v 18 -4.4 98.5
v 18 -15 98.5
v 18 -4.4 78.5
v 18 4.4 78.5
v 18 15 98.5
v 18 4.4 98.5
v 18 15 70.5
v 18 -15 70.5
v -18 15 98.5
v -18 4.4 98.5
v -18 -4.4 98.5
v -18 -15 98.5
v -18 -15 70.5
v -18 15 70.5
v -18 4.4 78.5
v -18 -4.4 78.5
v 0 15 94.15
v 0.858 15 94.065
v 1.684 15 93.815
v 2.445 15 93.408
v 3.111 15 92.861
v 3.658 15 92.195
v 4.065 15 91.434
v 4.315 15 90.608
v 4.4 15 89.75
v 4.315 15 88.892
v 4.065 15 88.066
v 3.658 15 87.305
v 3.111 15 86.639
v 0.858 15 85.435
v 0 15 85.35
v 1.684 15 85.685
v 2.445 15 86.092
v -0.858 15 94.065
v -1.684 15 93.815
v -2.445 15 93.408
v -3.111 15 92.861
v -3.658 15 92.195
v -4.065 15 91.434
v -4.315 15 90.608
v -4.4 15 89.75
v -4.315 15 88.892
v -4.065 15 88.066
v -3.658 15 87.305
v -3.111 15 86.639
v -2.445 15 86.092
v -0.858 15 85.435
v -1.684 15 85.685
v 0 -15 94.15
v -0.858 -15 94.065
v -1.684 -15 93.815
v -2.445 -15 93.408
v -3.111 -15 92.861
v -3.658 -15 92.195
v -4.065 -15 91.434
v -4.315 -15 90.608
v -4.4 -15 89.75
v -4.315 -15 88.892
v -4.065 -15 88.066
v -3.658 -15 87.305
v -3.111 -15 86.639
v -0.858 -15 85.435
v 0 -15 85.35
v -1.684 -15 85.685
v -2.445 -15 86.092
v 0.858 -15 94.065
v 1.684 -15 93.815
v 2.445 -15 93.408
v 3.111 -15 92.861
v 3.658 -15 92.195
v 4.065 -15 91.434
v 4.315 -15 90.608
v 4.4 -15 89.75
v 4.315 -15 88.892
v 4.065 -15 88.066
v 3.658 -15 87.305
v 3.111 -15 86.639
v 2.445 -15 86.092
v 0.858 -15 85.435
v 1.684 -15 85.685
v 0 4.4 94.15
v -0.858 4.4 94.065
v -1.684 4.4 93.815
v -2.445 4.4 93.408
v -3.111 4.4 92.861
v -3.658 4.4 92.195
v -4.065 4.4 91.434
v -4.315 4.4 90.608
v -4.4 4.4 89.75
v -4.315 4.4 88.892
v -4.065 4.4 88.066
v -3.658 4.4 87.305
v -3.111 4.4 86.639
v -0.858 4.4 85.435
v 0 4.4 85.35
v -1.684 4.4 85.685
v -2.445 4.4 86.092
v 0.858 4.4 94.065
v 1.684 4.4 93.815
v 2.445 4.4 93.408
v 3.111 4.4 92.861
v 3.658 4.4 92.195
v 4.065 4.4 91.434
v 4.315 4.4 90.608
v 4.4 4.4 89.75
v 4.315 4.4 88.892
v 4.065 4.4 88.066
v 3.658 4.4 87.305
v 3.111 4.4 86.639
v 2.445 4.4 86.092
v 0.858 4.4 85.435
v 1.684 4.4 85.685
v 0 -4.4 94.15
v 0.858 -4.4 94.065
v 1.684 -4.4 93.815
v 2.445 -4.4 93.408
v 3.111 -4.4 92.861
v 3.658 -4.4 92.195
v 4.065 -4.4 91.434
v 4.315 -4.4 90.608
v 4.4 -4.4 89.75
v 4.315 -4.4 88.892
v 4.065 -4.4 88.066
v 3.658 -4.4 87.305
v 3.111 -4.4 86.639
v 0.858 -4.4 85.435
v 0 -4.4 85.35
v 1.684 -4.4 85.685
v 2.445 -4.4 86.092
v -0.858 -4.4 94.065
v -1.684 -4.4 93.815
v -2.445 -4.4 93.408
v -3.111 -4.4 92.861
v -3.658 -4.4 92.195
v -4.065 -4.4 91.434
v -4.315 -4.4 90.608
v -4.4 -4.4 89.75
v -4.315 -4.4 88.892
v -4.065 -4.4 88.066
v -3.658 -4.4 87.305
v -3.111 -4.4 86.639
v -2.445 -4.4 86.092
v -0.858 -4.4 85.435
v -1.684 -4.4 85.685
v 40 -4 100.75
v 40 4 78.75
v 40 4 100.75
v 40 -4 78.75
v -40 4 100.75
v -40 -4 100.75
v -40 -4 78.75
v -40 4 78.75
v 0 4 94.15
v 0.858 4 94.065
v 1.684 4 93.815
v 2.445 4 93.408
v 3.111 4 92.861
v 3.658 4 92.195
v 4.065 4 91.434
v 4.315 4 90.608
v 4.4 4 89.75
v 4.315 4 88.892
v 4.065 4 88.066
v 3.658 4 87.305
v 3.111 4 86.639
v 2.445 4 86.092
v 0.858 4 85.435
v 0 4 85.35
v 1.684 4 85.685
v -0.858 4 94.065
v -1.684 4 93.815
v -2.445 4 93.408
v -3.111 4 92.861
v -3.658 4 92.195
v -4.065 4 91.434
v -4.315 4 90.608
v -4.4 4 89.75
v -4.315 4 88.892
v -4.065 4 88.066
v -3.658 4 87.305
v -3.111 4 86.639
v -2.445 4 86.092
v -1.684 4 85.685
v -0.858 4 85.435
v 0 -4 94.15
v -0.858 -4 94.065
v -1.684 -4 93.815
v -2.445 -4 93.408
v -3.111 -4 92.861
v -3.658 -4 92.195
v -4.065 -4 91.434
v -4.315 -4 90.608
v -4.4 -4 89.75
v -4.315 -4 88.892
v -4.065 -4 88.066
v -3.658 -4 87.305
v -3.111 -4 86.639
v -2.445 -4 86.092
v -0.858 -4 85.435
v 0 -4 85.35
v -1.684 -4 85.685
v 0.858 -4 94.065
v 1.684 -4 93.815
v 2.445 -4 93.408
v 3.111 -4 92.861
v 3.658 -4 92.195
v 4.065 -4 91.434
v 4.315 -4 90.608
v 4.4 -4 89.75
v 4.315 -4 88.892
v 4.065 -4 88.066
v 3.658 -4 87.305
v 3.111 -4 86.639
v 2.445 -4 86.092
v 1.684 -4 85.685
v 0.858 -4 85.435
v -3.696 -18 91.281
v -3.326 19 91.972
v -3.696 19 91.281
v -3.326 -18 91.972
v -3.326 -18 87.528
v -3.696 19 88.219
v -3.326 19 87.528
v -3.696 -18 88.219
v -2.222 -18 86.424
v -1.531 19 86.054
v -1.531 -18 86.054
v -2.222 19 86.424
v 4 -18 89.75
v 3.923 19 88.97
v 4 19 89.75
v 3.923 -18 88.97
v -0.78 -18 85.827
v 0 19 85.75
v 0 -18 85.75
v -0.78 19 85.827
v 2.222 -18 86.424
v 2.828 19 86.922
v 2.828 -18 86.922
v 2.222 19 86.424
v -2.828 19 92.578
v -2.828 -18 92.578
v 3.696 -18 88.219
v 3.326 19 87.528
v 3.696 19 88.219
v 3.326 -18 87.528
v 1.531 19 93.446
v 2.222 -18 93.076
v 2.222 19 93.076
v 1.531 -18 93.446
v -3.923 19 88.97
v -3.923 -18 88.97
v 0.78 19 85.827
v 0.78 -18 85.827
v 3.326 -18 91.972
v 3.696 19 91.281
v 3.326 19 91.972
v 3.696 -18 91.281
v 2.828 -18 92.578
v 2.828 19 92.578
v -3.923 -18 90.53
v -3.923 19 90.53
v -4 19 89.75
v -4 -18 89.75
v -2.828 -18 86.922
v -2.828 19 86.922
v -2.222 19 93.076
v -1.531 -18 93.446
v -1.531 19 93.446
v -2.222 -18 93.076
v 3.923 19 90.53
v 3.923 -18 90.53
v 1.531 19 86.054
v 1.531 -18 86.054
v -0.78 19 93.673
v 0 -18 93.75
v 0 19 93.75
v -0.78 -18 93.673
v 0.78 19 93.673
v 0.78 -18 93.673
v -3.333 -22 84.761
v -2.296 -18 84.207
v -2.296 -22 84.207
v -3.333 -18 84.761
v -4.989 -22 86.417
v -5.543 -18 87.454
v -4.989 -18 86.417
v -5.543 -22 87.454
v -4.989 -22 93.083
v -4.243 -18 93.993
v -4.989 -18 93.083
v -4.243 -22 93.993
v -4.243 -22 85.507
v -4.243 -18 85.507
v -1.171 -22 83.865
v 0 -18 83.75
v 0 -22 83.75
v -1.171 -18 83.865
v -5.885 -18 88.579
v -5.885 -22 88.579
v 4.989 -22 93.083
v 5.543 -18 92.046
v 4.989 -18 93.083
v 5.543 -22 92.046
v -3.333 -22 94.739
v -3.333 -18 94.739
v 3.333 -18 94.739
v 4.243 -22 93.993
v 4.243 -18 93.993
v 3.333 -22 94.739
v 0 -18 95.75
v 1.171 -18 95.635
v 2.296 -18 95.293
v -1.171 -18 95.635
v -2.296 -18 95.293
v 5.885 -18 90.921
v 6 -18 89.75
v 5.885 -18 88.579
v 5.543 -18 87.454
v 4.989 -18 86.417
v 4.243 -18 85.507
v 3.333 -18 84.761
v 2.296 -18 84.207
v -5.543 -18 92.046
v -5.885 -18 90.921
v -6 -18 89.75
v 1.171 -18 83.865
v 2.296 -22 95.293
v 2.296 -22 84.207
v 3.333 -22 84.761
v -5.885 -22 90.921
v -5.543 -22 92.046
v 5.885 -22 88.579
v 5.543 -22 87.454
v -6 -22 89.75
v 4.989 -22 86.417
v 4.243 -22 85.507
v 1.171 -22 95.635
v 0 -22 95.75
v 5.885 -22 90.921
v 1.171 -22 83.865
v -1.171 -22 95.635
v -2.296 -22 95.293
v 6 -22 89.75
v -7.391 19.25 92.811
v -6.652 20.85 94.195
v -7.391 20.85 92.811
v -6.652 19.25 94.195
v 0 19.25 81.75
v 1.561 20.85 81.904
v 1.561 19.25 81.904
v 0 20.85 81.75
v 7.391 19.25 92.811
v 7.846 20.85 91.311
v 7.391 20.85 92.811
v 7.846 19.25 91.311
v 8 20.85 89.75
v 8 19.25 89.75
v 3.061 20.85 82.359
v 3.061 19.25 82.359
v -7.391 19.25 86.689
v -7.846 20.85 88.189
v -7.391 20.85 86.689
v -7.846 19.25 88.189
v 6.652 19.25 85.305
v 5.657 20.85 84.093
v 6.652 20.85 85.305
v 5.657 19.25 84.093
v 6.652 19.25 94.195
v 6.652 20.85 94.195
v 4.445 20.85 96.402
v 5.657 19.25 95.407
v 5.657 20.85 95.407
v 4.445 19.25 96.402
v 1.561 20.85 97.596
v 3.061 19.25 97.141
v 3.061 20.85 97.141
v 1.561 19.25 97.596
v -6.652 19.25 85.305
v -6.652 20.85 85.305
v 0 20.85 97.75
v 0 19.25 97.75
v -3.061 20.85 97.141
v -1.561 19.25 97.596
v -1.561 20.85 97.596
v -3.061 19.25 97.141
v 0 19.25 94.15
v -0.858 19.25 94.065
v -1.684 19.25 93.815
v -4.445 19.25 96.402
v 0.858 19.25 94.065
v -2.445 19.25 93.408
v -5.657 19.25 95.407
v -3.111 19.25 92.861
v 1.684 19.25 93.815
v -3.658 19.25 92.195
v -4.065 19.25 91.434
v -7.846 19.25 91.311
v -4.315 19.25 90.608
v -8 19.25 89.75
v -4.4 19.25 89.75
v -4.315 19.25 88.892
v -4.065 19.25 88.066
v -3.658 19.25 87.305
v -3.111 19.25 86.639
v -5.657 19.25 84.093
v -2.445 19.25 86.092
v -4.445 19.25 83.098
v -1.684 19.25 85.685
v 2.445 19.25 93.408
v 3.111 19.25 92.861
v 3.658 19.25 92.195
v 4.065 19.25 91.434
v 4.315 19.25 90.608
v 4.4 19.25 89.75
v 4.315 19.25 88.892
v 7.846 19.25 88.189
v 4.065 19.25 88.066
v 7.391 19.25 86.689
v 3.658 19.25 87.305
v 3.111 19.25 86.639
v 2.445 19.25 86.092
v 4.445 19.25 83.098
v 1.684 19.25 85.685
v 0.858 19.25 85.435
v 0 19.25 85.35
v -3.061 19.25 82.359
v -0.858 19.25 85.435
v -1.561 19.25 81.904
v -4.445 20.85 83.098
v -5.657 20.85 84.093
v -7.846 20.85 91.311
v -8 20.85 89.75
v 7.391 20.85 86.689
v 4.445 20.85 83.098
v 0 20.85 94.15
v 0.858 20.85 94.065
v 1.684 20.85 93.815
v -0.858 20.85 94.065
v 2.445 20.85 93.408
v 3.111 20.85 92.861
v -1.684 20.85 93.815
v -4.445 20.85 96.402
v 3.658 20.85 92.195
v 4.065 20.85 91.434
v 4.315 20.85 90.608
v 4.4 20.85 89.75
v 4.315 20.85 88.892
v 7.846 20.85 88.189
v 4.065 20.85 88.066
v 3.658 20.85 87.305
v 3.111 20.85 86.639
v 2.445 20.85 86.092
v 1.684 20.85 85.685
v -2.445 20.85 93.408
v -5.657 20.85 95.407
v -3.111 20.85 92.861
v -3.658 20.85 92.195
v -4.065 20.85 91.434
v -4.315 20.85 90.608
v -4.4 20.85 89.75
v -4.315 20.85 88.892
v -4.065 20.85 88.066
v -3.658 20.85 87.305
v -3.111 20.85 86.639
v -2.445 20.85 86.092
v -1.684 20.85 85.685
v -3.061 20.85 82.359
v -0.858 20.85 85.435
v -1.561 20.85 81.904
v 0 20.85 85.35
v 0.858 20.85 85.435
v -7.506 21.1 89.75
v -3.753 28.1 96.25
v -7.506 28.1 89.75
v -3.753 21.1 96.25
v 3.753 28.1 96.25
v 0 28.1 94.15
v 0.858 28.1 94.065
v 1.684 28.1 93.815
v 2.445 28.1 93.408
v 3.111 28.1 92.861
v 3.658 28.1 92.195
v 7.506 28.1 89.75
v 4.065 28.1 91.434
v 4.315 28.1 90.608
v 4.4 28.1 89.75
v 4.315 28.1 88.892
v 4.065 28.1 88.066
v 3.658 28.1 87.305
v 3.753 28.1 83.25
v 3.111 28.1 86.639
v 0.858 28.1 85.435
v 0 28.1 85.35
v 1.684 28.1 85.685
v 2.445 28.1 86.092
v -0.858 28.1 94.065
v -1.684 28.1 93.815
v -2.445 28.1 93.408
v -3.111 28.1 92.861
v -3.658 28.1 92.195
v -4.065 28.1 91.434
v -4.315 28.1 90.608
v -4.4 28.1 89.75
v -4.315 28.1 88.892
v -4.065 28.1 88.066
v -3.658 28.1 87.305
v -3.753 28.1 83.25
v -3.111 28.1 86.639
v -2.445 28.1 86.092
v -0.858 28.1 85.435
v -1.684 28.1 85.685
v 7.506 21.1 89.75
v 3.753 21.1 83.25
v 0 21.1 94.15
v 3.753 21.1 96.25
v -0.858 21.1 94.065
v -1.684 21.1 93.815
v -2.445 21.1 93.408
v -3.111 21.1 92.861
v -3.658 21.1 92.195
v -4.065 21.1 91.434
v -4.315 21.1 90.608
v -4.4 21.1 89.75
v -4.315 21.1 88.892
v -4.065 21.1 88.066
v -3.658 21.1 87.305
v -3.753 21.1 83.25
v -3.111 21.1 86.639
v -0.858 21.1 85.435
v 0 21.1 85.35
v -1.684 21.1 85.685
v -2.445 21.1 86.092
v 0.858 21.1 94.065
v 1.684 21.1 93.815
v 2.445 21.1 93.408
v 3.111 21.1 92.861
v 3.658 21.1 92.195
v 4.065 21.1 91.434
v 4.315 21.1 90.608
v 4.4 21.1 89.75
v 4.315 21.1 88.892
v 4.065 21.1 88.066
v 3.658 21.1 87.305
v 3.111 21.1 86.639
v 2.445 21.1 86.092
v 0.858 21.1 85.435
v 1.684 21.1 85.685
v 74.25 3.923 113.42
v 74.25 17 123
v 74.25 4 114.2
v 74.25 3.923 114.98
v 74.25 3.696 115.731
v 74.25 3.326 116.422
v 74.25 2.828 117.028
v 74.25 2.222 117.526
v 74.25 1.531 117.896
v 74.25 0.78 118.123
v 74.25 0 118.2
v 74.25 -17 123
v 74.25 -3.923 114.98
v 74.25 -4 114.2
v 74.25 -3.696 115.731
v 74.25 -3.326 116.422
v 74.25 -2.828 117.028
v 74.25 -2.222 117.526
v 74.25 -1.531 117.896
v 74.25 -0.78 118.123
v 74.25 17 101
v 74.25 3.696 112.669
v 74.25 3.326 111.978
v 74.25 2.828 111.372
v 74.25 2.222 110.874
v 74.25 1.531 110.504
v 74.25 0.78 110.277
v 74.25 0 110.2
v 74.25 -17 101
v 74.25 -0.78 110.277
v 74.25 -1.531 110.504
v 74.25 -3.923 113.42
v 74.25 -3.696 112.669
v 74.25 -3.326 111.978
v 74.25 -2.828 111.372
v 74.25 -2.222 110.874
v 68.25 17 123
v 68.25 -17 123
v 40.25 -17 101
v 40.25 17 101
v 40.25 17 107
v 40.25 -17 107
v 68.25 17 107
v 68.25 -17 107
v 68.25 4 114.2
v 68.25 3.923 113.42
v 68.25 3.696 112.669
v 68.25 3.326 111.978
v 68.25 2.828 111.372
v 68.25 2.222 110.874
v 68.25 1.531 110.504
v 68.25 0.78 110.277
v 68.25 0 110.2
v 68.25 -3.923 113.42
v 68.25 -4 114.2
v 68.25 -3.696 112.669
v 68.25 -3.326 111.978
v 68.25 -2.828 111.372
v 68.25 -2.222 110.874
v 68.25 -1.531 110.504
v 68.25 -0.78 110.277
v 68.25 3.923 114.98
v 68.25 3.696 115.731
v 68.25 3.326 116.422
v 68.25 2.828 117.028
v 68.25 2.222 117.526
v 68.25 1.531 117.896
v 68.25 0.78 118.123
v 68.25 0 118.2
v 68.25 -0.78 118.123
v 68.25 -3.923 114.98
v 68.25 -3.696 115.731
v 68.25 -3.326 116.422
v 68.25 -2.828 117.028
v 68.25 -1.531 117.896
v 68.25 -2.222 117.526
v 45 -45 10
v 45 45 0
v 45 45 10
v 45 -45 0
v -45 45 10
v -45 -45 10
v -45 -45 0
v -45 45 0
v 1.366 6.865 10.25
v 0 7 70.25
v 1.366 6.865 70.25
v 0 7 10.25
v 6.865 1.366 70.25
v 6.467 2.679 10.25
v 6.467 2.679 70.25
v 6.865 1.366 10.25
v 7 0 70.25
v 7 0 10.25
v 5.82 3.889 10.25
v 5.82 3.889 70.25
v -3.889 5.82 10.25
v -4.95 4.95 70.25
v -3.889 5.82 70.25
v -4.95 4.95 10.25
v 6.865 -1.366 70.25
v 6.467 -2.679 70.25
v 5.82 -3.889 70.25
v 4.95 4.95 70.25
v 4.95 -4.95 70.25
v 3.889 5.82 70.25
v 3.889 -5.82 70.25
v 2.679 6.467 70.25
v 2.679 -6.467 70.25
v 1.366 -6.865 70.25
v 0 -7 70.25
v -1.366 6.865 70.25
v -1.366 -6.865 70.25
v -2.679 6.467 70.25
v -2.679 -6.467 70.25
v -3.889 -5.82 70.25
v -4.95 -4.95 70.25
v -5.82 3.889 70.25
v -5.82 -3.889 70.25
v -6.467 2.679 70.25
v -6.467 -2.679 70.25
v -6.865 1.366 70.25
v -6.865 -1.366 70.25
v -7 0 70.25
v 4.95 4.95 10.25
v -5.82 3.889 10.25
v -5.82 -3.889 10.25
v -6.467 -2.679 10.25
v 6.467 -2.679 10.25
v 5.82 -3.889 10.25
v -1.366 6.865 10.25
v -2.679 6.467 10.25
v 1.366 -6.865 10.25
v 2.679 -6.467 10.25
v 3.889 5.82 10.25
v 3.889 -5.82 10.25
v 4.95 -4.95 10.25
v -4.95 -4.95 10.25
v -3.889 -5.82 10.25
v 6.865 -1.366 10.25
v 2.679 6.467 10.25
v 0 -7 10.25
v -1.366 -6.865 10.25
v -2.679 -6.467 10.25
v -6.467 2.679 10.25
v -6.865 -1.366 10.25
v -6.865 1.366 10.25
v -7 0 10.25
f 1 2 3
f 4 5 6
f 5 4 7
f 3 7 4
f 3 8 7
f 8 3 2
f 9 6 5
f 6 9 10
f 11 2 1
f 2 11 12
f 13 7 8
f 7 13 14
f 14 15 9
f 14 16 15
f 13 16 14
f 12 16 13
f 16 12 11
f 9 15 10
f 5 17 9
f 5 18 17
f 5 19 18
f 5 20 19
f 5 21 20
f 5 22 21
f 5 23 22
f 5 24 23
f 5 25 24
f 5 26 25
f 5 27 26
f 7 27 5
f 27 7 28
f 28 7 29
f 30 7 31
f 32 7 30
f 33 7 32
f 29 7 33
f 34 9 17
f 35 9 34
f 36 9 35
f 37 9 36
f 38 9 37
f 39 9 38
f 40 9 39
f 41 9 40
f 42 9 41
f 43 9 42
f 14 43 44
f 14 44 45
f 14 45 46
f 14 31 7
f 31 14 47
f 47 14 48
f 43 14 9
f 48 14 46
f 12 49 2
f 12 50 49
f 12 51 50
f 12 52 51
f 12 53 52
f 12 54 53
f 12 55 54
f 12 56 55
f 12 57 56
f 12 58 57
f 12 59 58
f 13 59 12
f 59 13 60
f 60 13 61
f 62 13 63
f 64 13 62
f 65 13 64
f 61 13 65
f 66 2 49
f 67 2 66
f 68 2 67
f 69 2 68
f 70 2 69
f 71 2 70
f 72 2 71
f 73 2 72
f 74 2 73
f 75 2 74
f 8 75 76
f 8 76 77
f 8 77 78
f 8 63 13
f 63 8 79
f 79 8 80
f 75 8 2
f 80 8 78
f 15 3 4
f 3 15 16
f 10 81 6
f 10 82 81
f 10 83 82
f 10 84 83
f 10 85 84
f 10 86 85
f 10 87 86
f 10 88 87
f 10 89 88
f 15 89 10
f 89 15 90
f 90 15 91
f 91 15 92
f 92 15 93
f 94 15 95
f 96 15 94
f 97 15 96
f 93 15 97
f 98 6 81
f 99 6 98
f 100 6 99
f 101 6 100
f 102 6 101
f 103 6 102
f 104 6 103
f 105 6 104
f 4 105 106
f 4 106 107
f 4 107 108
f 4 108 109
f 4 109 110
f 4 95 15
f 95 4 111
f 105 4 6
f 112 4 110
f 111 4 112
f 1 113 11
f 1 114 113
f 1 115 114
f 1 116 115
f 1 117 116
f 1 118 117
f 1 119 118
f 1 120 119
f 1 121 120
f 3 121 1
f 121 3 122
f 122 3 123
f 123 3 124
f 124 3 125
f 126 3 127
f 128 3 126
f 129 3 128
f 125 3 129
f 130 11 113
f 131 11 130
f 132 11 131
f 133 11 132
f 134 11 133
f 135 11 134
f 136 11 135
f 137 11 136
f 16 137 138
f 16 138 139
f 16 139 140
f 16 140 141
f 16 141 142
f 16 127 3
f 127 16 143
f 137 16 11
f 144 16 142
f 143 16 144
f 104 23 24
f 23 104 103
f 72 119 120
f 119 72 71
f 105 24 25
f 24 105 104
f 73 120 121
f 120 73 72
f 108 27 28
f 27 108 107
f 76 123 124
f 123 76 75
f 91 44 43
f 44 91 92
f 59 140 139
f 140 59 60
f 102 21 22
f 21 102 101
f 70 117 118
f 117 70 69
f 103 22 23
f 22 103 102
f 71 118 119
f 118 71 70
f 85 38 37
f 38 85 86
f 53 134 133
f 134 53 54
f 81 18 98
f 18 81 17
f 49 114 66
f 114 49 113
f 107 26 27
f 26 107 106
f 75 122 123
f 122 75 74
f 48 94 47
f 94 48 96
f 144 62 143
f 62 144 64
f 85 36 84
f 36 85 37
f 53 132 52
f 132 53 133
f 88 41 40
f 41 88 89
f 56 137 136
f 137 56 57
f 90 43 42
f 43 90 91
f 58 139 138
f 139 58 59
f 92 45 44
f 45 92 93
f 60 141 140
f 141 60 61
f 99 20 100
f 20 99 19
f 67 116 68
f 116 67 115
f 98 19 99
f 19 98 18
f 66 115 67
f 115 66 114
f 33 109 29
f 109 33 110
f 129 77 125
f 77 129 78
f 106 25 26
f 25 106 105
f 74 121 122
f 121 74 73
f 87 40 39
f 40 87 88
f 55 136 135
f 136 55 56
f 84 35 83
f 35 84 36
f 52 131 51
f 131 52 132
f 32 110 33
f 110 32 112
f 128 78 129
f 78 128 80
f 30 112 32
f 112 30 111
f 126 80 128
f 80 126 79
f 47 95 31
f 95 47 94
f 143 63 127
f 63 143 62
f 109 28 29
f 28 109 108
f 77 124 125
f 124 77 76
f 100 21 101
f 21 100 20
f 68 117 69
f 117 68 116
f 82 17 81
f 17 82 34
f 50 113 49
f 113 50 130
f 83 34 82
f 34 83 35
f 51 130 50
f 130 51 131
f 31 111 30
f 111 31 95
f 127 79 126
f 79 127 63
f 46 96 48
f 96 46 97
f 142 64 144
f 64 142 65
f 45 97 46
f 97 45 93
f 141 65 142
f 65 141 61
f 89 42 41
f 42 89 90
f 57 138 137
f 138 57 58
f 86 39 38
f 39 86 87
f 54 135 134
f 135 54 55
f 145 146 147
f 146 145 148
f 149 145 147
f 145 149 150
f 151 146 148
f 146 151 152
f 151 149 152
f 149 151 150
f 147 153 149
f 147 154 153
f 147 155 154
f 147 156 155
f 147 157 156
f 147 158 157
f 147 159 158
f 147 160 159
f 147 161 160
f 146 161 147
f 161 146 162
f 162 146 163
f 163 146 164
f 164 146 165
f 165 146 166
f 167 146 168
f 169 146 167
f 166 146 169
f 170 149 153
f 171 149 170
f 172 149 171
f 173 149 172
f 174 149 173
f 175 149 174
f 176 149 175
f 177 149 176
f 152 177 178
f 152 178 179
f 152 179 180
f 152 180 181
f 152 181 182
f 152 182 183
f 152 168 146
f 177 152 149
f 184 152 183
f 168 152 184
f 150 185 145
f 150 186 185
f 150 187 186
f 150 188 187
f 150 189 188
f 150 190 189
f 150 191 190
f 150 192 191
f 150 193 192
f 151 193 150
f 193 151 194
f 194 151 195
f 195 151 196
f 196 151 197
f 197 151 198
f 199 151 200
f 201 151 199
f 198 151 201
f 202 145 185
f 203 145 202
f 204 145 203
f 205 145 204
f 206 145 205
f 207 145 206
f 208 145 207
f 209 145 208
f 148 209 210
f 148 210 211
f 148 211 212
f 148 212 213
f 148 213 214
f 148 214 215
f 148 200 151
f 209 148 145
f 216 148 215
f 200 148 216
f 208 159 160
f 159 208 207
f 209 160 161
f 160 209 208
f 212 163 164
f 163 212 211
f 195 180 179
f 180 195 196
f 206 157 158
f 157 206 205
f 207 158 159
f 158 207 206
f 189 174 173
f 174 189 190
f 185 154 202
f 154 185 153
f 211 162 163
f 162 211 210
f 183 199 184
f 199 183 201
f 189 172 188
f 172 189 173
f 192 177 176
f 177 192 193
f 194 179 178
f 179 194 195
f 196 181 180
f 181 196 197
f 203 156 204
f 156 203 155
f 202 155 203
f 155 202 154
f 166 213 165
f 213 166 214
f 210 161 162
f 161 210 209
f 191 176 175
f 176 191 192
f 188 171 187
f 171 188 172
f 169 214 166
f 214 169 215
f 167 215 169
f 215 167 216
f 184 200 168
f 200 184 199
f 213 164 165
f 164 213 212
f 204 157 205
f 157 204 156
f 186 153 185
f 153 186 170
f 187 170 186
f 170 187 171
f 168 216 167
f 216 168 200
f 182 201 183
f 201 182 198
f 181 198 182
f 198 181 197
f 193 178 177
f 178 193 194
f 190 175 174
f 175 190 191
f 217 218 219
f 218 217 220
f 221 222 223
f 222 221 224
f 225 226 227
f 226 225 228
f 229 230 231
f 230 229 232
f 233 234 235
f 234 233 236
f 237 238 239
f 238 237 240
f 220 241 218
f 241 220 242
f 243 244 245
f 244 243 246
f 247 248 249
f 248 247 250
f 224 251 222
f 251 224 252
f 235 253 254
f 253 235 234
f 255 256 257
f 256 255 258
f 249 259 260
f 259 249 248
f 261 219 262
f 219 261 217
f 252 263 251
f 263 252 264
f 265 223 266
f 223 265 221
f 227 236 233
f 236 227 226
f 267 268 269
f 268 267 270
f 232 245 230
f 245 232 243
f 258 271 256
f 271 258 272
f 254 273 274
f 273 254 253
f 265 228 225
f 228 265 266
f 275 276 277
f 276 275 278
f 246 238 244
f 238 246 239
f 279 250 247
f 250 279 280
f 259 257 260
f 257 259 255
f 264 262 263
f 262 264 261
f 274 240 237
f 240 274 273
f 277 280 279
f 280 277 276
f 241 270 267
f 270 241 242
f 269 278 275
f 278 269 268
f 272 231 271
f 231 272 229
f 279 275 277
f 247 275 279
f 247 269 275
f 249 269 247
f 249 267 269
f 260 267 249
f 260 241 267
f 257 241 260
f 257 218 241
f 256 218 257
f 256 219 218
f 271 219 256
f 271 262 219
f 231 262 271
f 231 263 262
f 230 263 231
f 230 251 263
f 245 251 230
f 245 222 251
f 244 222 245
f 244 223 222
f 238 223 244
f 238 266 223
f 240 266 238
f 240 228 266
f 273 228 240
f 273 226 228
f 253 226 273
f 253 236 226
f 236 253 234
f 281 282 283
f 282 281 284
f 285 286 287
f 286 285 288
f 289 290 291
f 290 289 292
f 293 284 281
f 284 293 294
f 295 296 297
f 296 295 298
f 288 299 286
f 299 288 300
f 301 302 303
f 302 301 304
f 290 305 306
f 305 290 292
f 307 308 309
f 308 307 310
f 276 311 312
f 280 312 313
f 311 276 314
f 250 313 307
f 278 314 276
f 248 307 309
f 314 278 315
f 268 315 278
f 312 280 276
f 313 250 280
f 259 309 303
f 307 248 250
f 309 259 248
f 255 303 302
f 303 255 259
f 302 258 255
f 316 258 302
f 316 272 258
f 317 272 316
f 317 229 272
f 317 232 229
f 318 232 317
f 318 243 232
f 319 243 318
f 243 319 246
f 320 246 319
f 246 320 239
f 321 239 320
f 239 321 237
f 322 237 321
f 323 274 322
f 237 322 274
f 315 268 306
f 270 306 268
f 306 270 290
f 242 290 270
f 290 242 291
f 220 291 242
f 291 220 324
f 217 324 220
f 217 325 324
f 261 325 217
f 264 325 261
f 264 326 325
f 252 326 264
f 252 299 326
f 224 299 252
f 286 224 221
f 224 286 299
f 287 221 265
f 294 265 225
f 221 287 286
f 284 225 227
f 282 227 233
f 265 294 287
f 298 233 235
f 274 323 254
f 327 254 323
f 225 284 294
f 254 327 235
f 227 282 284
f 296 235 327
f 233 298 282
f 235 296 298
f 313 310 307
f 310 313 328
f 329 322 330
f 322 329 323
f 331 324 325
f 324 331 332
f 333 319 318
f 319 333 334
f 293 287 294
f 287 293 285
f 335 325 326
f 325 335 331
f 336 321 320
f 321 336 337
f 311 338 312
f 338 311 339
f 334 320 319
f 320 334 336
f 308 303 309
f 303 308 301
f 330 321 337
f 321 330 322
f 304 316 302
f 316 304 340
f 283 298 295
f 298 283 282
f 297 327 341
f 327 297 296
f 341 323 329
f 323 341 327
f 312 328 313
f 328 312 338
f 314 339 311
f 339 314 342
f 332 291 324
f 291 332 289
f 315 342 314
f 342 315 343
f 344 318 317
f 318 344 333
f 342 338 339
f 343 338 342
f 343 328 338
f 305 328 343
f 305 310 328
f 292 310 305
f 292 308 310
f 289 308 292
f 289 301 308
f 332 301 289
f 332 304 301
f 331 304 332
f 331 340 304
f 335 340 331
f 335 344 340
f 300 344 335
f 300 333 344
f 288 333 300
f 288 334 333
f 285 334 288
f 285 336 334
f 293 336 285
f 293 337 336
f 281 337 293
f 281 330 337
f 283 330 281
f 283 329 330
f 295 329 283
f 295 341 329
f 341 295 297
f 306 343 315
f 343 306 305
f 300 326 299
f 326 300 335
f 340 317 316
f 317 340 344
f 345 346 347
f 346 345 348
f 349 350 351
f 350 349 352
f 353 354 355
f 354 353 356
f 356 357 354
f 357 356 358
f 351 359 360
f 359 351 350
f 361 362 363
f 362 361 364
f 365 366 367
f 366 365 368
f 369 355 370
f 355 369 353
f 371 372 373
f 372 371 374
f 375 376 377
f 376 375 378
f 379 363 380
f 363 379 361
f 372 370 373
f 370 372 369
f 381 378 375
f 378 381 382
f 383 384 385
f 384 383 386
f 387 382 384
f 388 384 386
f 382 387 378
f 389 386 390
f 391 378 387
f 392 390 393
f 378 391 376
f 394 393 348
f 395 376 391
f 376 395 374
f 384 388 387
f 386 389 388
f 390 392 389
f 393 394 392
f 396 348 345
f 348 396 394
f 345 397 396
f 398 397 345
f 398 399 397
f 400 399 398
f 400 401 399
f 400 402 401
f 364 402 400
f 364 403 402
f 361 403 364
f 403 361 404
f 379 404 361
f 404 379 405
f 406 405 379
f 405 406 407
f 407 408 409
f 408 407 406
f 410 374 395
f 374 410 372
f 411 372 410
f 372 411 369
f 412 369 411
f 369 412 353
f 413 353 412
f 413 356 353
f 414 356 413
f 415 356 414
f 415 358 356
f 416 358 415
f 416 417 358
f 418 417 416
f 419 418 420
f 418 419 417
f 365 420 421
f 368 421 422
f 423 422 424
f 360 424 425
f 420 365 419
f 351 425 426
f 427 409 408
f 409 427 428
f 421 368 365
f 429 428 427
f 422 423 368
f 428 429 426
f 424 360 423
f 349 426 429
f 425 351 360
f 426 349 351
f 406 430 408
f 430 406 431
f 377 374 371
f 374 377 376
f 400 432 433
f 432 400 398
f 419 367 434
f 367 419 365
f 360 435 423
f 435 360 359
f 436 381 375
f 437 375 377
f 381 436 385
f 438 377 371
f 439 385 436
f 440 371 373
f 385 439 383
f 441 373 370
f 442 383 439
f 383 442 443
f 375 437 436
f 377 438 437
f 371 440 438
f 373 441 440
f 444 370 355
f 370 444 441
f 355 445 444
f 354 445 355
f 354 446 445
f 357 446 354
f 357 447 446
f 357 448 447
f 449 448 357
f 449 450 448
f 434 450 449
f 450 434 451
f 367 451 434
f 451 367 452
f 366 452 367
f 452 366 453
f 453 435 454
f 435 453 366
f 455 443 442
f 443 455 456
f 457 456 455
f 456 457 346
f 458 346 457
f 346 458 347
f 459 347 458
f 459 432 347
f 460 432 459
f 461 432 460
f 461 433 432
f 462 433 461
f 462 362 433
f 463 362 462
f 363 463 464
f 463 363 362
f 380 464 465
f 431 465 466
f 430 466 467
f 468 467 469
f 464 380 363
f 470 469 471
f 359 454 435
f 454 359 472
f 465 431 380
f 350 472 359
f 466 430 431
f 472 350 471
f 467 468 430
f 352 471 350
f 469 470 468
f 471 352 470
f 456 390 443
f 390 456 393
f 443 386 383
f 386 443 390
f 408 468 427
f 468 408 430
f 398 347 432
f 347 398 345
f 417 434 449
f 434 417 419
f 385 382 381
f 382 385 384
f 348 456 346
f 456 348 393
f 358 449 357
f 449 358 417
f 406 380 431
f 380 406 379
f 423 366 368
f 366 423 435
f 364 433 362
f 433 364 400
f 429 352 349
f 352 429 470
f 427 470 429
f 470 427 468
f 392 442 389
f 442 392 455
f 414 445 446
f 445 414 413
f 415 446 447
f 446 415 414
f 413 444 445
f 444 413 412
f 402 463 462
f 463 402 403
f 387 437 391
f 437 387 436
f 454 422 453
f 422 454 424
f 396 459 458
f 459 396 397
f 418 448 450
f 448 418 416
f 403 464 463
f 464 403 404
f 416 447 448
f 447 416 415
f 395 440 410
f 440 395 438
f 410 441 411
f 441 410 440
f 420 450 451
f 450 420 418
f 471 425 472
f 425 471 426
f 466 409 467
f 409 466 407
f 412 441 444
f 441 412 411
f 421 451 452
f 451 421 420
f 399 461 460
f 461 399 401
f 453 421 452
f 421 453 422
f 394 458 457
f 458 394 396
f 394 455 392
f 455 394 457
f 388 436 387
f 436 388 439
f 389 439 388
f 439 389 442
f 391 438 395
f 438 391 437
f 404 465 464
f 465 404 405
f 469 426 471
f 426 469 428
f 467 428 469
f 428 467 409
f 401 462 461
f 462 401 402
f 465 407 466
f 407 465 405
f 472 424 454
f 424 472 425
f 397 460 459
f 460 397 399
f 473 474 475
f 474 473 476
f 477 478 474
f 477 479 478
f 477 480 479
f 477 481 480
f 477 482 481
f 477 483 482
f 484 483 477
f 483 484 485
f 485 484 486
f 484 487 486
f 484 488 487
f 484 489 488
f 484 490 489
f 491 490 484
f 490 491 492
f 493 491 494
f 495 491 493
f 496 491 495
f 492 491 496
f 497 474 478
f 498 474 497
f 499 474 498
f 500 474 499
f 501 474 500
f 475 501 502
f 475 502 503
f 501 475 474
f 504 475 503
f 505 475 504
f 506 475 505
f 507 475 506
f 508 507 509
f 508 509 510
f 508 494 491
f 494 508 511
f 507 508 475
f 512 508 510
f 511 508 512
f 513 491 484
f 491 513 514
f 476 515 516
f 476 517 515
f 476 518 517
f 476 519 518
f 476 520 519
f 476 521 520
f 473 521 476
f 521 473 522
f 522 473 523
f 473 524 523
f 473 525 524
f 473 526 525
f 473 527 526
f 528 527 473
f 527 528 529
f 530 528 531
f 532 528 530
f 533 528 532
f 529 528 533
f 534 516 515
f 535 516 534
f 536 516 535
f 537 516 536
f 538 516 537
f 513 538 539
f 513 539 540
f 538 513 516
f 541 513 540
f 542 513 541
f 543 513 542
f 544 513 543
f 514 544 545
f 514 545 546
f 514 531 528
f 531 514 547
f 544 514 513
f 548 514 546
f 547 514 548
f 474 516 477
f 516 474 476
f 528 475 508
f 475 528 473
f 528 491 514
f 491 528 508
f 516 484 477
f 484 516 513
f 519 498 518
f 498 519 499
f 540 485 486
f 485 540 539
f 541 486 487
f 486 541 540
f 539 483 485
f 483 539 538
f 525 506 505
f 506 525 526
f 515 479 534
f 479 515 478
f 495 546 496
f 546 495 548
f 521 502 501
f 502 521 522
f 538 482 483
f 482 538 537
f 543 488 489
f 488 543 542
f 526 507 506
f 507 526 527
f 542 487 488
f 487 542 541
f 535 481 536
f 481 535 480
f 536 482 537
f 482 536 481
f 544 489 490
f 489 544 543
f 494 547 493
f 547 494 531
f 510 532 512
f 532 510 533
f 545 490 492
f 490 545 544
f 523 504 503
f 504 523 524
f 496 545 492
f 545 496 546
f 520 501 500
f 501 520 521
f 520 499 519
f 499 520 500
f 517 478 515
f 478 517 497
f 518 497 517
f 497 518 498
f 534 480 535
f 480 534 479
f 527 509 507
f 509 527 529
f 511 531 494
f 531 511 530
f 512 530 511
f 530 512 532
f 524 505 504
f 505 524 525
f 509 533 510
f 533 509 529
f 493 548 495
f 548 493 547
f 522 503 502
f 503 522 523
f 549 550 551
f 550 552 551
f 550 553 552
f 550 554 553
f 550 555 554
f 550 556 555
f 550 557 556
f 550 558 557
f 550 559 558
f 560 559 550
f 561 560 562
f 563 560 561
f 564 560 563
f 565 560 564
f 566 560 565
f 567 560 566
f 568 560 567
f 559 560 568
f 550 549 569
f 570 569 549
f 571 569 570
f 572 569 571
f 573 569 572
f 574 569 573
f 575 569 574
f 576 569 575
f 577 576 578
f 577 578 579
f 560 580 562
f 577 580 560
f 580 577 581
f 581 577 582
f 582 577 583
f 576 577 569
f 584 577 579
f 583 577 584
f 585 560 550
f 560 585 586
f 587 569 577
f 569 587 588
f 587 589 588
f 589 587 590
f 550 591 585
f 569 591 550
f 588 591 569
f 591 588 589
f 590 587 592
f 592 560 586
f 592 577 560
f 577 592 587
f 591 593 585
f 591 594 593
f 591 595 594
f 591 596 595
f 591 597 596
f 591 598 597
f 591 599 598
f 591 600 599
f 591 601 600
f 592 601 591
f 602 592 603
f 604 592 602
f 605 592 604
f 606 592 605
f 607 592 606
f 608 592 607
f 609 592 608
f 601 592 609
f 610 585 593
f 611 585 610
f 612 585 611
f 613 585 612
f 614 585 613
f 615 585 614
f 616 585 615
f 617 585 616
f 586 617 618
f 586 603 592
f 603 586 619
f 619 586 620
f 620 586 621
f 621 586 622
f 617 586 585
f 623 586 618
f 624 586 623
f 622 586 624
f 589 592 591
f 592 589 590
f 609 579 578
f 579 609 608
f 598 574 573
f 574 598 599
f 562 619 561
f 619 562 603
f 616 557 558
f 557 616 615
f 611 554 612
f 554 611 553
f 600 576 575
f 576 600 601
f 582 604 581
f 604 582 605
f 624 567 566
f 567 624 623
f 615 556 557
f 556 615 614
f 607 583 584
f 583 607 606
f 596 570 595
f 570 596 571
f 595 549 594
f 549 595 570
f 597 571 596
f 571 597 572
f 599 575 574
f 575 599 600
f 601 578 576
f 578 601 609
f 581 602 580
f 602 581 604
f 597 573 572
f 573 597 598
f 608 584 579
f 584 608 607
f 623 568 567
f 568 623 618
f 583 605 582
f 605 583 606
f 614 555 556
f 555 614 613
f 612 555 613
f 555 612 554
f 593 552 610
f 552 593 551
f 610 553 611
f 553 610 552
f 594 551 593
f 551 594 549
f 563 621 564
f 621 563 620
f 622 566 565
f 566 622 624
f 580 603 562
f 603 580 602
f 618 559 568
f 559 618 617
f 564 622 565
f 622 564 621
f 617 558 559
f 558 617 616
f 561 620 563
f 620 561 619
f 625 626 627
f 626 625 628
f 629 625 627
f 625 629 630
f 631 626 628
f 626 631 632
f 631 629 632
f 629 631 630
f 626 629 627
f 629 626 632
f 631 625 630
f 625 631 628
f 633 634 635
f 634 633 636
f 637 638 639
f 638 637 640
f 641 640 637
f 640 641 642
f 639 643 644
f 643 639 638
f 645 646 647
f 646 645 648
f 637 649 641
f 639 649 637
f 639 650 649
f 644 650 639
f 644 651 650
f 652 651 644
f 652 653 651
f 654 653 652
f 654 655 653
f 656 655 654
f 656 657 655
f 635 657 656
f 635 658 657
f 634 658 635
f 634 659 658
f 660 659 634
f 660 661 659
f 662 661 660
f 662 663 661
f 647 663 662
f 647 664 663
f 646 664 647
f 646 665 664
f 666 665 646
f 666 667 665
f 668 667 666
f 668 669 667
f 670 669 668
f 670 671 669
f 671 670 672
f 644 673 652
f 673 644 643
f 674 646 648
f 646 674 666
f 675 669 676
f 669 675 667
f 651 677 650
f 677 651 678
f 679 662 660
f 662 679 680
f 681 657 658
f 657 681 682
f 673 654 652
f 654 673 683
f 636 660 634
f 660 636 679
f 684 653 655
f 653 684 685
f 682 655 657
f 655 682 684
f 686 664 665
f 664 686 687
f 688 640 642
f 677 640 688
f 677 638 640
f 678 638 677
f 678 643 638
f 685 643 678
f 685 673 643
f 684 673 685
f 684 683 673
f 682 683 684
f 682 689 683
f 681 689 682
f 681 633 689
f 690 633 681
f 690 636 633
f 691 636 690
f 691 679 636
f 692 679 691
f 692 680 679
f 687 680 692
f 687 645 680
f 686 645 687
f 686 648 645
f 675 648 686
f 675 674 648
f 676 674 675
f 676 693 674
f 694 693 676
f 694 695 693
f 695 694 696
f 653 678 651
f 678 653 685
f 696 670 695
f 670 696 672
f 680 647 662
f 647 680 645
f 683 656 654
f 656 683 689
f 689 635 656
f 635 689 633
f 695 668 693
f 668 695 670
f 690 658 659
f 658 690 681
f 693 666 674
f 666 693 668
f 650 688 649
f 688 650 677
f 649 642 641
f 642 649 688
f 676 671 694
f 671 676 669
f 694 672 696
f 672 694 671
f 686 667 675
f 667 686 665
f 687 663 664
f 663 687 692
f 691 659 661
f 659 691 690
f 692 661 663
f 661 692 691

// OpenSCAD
$fn = 32;

// ------------------------------------------------------------------------
// Lamp arm: column d14 x 60 mm, arm 80 mm
// Every part is its own module, assembly() places every instance.
// ------------------------------------------------------------------------

// --- part 1 ---
module lamp_base() {
  difference() {
    translate([-45, -45, 0]) cube([90, 90, 10]);
  }
}

// --- part 2 ---
module lamp_column() {
  cylinder(h = 60, d = 14);
}

// --- part 3 ---
module head_fork() {
  difference() {
    translate([-18, -15, 0]) cube([36, 30, 28]);
    translate([-19, -4.4, 8]) cube([38, 8.8, 21]);
    translate([0, 0, 19.25]) rotate([90, 0, 0]) cylinder(h = 32, d = 8.8, center = true);
  }
}

// --- part 4 ---
module lamp_arm() {
  difference() {
    translate([-40, -4, 0]) cube([80, 8, 22]);
    translate([0, 0, 11]) rotate([90, 0, 0]) cylinder(h = 10, d = 8.8, center = true);
  }
}

// --- part 5 ---
module arm_pin() {
  rotate([0, 90, 0]) cylinder(h = 38, d = 8, center = true);
  translate([-22, 0, 0]) rotate([0, 90, 0]) cylinder(h = 4, d = 12);
}

// --- part 6 ---
module arm_washer() {
  difference() {
      translate([0, 0, 0]) cylinder(h = 1.6, d = 16);
      translate([0, 0, -1]) cylinder(h = 3.6, d = 8.8);
    }
}

// --- part 7 ---
module arm_nut() {
  difference() {
    linear_extrude(height = 7) polygon(points = [[7.506, 0], [3.753, 6.5], [-3.753, 6.5], [-7.506, 0], [-3.753, -6.5], [3.753, -6.5]]);
    translate([0, 0, -1]) cylinder(h = 9, d = 8.8);
  }
}

// --- part 8 ---
module shade_bracket() {
  difference() {
    translate([-17, -17, 0]) cube([34, 34, 22]);
    translate([-18, -18, 6]) cube([29, 36, 17]);
    translate([14, 0, 13.2]) rotate([0, 90, 0]) cylinder(h = 8, d = 8, center = true);
  }
}

// --- assembly ---
module assembly() {
  color([0.80, 0.24, 0.20]) translate([0, 0, 0]) rotate([0, 0, 0]) lamp_base();
  color([0.20, 0.45, 0.75]) translate([0, 0, 10.25]) rotate([0, 0, 0]) lamp_column();
  color([0.25, 0.62, 0.32]) translate([0, 0, 70.5]) rotate([0, 0, 0]) head_fork();
  color([0.92, 0.70, 0.18]) translate([0, 0, 78.75]) rotate([0, 0, 0]) lamp_arm();
  color([0.58, 0.35, 0.70]) translate([0, 0, 89.75]) rotate([0, 0, 90]) arm_pin();
  color([0.16, 0.66, 0.66]) translate([0, 20.85, 89.75]) rotate([90, 0, 0]) arm_washer();
  color([0.85, 0.48, 0.18]) translate([0, 28.1, 89.75]) rotate([90, 0, 0]) arm_nut();
  color([0.55, 0.60, 0.65]) translate([57.25, 0, 101]) rotate([0, 0, 0]) shade_bracket();
}

assembly();
